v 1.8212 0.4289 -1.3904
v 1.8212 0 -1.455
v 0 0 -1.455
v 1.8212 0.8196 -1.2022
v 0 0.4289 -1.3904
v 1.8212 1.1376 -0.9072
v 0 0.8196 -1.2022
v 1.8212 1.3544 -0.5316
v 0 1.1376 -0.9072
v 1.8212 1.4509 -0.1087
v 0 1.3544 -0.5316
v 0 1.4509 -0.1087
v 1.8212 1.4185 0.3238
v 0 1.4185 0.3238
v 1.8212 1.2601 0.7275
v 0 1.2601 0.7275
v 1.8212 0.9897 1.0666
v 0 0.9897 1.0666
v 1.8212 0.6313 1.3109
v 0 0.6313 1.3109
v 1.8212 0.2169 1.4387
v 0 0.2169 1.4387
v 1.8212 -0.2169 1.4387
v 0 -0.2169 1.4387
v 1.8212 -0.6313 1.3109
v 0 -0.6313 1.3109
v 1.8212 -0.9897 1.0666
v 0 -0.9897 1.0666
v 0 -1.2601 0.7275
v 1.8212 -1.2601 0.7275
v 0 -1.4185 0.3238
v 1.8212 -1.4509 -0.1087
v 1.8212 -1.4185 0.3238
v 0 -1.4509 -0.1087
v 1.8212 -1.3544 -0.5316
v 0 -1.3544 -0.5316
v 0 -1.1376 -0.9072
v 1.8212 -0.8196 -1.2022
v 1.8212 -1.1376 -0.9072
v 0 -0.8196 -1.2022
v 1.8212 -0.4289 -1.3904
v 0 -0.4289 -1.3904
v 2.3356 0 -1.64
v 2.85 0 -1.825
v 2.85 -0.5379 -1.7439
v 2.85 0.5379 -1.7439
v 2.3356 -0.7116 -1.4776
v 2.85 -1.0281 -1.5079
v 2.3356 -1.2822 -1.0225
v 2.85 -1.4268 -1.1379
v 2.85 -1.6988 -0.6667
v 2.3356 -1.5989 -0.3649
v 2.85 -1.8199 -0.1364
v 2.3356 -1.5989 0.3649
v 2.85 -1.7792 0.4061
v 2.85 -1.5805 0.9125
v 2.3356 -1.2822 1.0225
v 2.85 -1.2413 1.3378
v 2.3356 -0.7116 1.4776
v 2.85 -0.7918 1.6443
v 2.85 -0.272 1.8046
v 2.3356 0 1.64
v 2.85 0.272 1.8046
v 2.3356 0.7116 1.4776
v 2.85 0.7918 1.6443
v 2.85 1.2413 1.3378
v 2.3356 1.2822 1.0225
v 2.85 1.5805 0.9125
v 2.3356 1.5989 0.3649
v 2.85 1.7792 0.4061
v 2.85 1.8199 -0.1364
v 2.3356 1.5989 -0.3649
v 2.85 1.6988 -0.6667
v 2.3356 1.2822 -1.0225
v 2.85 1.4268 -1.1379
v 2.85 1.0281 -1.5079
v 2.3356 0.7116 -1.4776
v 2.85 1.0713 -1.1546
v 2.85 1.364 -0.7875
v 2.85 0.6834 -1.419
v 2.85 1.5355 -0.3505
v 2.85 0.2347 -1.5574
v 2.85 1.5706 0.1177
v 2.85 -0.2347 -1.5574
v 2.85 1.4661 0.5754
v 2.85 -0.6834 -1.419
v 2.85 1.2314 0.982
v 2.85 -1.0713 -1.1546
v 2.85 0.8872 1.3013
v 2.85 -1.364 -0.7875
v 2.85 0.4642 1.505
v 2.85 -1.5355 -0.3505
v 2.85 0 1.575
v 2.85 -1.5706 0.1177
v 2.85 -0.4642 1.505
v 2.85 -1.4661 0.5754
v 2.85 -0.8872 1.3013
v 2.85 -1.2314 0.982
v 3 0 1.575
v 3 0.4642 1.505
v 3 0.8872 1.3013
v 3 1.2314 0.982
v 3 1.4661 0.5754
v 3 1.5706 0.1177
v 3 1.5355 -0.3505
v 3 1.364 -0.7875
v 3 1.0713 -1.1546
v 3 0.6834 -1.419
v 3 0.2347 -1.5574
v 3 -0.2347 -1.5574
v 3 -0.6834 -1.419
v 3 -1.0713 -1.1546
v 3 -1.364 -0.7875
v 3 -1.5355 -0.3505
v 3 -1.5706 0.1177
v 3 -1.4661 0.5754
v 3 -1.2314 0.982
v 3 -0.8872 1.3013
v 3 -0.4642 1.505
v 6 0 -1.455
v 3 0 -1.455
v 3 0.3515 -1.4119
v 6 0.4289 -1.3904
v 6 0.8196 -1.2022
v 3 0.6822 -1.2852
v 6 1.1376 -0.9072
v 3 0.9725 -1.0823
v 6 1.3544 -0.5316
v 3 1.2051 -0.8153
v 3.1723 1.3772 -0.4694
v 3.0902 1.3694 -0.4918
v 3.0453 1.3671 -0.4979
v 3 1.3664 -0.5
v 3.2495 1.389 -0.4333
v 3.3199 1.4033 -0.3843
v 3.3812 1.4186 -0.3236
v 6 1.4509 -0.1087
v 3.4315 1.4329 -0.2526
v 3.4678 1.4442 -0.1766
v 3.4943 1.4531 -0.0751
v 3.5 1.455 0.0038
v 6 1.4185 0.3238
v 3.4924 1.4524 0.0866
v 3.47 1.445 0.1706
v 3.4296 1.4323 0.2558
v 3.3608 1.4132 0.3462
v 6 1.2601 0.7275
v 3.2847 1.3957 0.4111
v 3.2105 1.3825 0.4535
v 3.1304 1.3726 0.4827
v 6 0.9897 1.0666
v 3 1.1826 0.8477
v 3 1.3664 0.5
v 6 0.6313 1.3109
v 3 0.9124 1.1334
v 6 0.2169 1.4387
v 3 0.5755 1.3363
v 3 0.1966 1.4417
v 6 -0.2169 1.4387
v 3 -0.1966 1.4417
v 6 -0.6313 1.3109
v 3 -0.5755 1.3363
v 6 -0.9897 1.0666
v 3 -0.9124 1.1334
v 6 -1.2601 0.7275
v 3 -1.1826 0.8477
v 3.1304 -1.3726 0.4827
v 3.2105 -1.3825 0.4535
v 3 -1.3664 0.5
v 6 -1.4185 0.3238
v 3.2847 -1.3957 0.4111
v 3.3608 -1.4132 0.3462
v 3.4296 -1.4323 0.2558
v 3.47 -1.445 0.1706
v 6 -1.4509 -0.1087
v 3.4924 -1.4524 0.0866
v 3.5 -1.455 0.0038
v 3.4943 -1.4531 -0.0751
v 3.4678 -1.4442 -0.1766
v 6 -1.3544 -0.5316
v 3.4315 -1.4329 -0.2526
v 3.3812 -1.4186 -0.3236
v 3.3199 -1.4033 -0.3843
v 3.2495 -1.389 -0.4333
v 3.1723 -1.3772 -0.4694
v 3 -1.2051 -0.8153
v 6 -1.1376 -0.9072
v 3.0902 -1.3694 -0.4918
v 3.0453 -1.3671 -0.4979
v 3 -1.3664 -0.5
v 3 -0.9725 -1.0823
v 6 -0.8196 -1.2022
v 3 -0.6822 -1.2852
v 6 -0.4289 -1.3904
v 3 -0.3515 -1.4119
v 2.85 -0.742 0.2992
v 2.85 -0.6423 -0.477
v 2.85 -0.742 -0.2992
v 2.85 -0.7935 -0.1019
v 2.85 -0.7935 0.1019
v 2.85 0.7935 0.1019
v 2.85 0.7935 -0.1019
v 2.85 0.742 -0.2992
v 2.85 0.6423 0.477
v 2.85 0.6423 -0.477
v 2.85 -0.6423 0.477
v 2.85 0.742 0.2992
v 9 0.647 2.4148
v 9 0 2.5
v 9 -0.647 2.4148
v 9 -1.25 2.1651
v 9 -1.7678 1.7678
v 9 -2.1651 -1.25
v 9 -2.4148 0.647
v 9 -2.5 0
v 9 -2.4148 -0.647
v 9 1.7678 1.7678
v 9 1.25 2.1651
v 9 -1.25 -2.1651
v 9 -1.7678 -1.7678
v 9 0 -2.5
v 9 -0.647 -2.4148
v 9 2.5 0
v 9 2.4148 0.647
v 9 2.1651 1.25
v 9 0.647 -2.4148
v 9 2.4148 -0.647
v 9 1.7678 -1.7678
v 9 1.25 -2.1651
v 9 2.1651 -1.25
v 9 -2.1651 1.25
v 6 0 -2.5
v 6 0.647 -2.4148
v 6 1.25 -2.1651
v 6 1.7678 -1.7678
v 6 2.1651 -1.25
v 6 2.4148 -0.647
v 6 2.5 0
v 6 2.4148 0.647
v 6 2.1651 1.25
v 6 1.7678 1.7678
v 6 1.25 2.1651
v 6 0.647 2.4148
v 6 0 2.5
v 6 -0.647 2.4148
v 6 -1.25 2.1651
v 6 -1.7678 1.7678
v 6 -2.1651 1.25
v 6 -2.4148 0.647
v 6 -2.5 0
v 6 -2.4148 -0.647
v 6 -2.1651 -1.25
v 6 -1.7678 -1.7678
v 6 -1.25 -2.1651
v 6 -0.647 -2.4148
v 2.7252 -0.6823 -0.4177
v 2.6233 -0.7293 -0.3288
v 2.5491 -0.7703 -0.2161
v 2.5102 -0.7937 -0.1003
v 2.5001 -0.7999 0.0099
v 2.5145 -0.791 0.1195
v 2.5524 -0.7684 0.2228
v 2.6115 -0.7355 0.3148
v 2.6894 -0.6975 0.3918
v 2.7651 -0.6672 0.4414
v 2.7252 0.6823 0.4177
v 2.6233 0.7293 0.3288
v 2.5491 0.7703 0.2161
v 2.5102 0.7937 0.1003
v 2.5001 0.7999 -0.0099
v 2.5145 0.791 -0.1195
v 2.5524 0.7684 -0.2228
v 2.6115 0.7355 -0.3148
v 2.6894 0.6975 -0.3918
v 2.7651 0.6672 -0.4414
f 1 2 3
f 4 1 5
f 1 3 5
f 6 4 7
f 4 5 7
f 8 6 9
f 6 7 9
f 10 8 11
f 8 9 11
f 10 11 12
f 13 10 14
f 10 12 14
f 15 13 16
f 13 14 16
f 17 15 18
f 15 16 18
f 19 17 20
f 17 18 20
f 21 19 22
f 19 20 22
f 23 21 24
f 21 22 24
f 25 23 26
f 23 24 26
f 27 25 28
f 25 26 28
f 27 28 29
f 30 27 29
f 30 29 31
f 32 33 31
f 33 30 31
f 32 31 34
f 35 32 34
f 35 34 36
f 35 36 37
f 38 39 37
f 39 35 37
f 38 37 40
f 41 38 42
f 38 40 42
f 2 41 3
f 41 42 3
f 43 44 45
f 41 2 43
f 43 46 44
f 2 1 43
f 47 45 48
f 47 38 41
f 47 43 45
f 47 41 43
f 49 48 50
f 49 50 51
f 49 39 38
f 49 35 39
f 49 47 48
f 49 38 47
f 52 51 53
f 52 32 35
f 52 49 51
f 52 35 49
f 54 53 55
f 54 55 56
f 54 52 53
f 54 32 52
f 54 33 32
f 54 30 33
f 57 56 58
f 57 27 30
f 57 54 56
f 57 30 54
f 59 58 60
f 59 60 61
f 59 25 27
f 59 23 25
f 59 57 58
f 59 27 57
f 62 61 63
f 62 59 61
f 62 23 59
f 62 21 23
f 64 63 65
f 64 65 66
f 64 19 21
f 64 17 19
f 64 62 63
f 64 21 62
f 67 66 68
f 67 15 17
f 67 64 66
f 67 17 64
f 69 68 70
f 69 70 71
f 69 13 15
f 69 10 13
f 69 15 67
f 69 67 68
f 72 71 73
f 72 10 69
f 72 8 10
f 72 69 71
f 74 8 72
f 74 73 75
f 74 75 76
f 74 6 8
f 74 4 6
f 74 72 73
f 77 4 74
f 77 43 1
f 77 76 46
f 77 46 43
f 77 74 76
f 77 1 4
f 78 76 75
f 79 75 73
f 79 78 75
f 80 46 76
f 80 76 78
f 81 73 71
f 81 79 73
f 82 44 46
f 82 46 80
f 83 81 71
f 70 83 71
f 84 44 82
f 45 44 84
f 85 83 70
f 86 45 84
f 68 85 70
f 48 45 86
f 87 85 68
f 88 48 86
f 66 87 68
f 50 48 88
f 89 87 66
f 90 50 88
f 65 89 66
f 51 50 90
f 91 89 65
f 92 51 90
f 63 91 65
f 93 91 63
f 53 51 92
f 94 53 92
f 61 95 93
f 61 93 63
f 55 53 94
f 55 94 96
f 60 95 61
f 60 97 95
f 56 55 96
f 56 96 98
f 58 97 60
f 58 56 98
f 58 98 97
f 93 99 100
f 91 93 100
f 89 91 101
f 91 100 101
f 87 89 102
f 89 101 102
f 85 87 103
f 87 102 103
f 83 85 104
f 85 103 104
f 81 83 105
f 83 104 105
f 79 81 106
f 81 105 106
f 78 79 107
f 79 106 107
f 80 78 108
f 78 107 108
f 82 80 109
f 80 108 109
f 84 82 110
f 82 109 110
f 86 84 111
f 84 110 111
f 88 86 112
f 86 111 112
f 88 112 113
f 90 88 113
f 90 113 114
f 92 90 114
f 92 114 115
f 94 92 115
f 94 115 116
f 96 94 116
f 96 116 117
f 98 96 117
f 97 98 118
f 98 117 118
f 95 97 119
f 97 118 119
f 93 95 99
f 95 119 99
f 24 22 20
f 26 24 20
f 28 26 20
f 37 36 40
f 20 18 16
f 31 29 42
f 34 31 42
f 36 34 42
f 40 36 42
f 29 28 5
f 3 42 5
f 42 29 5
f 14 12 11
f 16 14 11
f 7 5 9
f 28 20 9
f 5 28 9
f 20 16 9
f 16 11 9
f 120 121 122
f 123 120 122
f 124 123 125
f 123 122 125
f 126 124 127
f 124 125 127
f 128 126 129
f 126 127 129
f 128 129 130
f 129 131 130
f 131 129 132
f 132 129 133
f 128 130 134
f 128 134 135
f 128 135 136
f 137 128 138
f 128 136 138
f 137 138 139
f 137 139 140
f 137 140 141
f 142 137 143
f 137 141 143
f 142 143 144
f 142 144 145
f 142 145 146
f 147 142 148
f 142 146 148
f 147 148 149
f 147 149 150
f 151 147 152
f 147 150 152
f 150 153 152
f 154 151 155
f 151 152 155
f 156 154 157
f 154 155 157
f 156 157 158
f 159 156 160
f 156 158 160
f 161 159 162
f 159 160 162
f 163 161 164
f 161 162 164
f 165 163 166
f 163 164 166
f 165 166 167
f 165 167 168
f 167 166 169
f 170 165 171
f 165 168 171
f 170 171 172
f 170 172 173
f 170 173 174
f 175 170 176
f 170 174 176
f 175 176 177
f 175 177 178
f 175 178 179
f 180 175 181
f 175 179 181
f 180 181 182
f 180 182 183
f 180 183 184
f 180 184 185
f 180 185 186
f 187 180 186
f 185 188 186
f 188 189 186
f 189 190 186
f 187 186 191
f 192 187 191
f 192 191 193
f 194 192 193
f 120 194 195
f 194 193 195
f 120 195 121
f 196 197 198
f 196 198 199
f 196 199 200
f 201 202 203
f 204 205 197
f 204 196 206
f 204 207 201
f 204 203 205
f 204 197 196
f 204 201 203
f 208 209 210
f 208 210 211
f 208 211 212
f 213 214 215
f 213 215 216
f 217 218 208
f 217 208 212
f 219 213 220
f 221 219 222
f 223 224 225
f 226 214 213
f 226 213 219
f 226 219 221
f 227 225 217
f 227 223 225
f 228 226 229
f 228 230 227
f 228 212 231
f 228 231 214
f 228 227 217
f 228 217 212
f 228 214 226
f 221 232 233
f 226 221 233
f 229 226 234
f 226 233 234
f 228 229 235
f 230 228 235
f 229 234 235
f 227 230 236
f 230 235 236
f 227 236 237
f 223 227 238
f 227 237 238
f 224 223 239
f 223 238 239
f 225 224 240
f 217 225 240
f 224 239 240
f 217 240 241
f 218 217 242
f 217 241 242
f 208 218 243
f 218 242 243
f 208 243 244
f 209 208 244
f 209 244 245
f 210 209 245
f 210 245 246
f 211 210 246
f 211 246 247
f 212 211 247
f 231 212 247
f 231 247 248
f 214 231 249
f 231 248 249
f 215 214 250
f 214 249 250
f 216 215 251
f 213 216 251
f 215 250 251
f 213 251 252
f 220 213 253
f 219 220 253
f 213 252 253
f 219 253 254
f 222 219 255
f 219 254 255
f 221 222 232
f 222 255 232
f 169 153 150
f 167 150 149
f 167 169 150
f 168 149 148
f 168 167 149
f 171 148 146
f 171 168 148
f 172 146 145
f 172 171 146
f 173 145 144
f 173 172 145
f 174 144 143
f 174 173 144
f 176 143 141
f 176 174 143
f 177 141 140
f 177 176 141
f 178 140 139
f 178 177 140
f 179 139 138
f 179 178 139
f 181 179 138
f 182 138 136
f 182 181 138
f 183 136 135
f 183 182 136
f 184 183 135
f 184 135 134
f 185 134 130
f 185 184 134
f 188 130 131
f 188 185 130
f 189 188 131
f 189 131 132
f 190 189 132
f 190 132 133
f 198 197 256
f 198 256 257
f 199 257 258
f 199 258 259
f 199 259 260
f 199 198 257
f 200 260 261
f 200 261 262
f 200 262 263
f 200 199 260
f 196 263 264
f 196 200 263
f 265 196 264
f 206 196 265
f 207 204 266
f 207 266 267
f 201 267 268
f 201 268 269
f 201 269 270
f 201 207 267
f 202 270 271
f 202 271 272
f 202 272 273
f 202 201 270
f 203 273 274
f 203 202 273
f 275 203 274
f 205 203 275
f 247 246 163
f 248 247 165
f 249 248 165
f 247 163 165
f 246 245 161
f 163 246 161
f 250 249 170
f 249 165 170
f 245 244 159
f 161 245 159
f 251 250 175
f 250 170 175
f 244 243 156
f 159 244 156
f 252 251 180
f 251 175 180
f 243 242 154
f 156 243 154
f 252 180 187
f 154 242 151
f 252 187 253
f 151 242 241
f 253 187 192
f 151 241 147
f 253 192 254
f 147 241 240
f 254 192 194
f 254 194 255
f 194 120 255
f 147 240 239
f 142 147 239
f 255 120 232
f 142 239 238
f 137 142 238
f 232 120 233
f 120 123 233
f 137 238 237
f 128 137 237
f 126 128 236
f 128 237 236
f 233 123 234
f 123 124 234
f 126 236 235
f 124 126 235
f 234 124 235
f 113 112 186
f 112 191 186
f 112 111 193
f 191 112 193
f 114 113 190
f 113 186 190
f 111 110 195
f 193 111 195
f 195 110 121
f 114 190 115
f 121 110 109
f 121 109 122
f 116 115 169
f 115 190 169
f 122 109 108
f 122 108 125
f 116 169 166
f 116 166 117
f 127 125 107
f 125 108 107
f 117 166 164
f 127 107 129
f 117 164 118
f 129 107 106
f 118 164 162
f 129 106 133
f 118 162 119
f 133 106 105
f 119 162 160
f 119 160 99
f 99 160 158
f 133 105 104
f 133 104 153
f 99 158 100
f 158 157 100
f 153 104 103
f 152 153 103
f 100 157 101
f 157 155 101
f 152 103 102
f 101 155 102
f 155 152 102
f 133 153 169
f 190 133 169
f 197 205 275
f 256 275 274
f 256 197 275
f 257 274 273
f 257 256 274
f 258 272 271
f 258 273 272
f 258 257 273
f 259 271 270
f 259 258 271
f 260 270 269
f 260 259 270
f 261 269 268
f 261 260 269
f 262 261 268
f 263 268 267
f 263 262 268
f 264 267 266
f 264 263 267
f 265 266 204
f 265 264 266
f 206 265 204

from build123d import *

# Parameters (mm, degrees)
SKETCH2_R               = 1.455
BOSS_EXTRUDE3_DEPTH     = 6
SKETCH3_R               = 2.5
BOSS_EXTRUDE4_DEPTH     = 3
CUT_EXTRUDE1_DEPTH      = 10.669539803
CUT_EXTRUDE1_DEPTH_BACK = 10.669539803
SKETCH4_R               = 0.5
SKETCH6_R               = 1.575
BOSS_EXTRUDE5_DEPTH     = 0.15


with BuildPart() as part:
    # Sketch2 → Boss-Extrude3 (new body)
    with BuildSketch(Plane(origin=(0, 0, 0), x_dir=(0, 0, -1), z_dir=(1, 0, 0))):
        Circle(SKETCH2_R)
    extrude(amount=BOSS_EXTRUDE3_DEPTH)

    # Sketch3 → Boss-Extrude4 (add)
    with BuildSketch(Plane(origin=(6, 0, 0), x_dir=(0, 0, -1), z_dir=(1, 0, 0))):
        Circle(SKETCH3_R)
    extrude(amount=BOSS_EXTRUDE4_DEPTH)

    # Sketch4 → Cut-Extrude1 (cut, two sides: drawn at the far end of the back side and taken through both)
    with BuildSketch(Plane(origin=(0, 0, 0), x_dir=(1, 0, 0), z_dir=(0, 1, 0)).offset(-CUT_EXTRUDE1_DEPTH_BACK)):
        with Locations(Location((3, 0, 0), (0, 0, 270))):
            Circle(SKETCH4_R)
    extrude(amount=CUT_EXTRUDE1_DEPTH + CUT_EXTRUDE1_DEPTH_BACK, mode=Mode.SUBTRACT)

    # Sketch6 → Boss-Extrude5 (add)
    with BuildSketch(Plane.ZY.offset(-3)):
        Circle(SKETCH6_R)
    extrude(amount=BOSS_EXTRUDE5_DEPTH)

    # Sketch7 → Revolve1 (revolve)
    with BuildSketch(Plane.XY, mode=Mode.PRIVATE) as revolve1_sk:
        Polygon((2.85, 1.825), (0, 0.8), (2.85, 0.8), align=None)
    revolve(revolve1_sk.sketch.rotate(Axis((9.45, 0, 0), (-1, 0, 0)), 90), axis=Axis((9.45, 0, 0), (-1, 0, 0)))


solid = part.part
